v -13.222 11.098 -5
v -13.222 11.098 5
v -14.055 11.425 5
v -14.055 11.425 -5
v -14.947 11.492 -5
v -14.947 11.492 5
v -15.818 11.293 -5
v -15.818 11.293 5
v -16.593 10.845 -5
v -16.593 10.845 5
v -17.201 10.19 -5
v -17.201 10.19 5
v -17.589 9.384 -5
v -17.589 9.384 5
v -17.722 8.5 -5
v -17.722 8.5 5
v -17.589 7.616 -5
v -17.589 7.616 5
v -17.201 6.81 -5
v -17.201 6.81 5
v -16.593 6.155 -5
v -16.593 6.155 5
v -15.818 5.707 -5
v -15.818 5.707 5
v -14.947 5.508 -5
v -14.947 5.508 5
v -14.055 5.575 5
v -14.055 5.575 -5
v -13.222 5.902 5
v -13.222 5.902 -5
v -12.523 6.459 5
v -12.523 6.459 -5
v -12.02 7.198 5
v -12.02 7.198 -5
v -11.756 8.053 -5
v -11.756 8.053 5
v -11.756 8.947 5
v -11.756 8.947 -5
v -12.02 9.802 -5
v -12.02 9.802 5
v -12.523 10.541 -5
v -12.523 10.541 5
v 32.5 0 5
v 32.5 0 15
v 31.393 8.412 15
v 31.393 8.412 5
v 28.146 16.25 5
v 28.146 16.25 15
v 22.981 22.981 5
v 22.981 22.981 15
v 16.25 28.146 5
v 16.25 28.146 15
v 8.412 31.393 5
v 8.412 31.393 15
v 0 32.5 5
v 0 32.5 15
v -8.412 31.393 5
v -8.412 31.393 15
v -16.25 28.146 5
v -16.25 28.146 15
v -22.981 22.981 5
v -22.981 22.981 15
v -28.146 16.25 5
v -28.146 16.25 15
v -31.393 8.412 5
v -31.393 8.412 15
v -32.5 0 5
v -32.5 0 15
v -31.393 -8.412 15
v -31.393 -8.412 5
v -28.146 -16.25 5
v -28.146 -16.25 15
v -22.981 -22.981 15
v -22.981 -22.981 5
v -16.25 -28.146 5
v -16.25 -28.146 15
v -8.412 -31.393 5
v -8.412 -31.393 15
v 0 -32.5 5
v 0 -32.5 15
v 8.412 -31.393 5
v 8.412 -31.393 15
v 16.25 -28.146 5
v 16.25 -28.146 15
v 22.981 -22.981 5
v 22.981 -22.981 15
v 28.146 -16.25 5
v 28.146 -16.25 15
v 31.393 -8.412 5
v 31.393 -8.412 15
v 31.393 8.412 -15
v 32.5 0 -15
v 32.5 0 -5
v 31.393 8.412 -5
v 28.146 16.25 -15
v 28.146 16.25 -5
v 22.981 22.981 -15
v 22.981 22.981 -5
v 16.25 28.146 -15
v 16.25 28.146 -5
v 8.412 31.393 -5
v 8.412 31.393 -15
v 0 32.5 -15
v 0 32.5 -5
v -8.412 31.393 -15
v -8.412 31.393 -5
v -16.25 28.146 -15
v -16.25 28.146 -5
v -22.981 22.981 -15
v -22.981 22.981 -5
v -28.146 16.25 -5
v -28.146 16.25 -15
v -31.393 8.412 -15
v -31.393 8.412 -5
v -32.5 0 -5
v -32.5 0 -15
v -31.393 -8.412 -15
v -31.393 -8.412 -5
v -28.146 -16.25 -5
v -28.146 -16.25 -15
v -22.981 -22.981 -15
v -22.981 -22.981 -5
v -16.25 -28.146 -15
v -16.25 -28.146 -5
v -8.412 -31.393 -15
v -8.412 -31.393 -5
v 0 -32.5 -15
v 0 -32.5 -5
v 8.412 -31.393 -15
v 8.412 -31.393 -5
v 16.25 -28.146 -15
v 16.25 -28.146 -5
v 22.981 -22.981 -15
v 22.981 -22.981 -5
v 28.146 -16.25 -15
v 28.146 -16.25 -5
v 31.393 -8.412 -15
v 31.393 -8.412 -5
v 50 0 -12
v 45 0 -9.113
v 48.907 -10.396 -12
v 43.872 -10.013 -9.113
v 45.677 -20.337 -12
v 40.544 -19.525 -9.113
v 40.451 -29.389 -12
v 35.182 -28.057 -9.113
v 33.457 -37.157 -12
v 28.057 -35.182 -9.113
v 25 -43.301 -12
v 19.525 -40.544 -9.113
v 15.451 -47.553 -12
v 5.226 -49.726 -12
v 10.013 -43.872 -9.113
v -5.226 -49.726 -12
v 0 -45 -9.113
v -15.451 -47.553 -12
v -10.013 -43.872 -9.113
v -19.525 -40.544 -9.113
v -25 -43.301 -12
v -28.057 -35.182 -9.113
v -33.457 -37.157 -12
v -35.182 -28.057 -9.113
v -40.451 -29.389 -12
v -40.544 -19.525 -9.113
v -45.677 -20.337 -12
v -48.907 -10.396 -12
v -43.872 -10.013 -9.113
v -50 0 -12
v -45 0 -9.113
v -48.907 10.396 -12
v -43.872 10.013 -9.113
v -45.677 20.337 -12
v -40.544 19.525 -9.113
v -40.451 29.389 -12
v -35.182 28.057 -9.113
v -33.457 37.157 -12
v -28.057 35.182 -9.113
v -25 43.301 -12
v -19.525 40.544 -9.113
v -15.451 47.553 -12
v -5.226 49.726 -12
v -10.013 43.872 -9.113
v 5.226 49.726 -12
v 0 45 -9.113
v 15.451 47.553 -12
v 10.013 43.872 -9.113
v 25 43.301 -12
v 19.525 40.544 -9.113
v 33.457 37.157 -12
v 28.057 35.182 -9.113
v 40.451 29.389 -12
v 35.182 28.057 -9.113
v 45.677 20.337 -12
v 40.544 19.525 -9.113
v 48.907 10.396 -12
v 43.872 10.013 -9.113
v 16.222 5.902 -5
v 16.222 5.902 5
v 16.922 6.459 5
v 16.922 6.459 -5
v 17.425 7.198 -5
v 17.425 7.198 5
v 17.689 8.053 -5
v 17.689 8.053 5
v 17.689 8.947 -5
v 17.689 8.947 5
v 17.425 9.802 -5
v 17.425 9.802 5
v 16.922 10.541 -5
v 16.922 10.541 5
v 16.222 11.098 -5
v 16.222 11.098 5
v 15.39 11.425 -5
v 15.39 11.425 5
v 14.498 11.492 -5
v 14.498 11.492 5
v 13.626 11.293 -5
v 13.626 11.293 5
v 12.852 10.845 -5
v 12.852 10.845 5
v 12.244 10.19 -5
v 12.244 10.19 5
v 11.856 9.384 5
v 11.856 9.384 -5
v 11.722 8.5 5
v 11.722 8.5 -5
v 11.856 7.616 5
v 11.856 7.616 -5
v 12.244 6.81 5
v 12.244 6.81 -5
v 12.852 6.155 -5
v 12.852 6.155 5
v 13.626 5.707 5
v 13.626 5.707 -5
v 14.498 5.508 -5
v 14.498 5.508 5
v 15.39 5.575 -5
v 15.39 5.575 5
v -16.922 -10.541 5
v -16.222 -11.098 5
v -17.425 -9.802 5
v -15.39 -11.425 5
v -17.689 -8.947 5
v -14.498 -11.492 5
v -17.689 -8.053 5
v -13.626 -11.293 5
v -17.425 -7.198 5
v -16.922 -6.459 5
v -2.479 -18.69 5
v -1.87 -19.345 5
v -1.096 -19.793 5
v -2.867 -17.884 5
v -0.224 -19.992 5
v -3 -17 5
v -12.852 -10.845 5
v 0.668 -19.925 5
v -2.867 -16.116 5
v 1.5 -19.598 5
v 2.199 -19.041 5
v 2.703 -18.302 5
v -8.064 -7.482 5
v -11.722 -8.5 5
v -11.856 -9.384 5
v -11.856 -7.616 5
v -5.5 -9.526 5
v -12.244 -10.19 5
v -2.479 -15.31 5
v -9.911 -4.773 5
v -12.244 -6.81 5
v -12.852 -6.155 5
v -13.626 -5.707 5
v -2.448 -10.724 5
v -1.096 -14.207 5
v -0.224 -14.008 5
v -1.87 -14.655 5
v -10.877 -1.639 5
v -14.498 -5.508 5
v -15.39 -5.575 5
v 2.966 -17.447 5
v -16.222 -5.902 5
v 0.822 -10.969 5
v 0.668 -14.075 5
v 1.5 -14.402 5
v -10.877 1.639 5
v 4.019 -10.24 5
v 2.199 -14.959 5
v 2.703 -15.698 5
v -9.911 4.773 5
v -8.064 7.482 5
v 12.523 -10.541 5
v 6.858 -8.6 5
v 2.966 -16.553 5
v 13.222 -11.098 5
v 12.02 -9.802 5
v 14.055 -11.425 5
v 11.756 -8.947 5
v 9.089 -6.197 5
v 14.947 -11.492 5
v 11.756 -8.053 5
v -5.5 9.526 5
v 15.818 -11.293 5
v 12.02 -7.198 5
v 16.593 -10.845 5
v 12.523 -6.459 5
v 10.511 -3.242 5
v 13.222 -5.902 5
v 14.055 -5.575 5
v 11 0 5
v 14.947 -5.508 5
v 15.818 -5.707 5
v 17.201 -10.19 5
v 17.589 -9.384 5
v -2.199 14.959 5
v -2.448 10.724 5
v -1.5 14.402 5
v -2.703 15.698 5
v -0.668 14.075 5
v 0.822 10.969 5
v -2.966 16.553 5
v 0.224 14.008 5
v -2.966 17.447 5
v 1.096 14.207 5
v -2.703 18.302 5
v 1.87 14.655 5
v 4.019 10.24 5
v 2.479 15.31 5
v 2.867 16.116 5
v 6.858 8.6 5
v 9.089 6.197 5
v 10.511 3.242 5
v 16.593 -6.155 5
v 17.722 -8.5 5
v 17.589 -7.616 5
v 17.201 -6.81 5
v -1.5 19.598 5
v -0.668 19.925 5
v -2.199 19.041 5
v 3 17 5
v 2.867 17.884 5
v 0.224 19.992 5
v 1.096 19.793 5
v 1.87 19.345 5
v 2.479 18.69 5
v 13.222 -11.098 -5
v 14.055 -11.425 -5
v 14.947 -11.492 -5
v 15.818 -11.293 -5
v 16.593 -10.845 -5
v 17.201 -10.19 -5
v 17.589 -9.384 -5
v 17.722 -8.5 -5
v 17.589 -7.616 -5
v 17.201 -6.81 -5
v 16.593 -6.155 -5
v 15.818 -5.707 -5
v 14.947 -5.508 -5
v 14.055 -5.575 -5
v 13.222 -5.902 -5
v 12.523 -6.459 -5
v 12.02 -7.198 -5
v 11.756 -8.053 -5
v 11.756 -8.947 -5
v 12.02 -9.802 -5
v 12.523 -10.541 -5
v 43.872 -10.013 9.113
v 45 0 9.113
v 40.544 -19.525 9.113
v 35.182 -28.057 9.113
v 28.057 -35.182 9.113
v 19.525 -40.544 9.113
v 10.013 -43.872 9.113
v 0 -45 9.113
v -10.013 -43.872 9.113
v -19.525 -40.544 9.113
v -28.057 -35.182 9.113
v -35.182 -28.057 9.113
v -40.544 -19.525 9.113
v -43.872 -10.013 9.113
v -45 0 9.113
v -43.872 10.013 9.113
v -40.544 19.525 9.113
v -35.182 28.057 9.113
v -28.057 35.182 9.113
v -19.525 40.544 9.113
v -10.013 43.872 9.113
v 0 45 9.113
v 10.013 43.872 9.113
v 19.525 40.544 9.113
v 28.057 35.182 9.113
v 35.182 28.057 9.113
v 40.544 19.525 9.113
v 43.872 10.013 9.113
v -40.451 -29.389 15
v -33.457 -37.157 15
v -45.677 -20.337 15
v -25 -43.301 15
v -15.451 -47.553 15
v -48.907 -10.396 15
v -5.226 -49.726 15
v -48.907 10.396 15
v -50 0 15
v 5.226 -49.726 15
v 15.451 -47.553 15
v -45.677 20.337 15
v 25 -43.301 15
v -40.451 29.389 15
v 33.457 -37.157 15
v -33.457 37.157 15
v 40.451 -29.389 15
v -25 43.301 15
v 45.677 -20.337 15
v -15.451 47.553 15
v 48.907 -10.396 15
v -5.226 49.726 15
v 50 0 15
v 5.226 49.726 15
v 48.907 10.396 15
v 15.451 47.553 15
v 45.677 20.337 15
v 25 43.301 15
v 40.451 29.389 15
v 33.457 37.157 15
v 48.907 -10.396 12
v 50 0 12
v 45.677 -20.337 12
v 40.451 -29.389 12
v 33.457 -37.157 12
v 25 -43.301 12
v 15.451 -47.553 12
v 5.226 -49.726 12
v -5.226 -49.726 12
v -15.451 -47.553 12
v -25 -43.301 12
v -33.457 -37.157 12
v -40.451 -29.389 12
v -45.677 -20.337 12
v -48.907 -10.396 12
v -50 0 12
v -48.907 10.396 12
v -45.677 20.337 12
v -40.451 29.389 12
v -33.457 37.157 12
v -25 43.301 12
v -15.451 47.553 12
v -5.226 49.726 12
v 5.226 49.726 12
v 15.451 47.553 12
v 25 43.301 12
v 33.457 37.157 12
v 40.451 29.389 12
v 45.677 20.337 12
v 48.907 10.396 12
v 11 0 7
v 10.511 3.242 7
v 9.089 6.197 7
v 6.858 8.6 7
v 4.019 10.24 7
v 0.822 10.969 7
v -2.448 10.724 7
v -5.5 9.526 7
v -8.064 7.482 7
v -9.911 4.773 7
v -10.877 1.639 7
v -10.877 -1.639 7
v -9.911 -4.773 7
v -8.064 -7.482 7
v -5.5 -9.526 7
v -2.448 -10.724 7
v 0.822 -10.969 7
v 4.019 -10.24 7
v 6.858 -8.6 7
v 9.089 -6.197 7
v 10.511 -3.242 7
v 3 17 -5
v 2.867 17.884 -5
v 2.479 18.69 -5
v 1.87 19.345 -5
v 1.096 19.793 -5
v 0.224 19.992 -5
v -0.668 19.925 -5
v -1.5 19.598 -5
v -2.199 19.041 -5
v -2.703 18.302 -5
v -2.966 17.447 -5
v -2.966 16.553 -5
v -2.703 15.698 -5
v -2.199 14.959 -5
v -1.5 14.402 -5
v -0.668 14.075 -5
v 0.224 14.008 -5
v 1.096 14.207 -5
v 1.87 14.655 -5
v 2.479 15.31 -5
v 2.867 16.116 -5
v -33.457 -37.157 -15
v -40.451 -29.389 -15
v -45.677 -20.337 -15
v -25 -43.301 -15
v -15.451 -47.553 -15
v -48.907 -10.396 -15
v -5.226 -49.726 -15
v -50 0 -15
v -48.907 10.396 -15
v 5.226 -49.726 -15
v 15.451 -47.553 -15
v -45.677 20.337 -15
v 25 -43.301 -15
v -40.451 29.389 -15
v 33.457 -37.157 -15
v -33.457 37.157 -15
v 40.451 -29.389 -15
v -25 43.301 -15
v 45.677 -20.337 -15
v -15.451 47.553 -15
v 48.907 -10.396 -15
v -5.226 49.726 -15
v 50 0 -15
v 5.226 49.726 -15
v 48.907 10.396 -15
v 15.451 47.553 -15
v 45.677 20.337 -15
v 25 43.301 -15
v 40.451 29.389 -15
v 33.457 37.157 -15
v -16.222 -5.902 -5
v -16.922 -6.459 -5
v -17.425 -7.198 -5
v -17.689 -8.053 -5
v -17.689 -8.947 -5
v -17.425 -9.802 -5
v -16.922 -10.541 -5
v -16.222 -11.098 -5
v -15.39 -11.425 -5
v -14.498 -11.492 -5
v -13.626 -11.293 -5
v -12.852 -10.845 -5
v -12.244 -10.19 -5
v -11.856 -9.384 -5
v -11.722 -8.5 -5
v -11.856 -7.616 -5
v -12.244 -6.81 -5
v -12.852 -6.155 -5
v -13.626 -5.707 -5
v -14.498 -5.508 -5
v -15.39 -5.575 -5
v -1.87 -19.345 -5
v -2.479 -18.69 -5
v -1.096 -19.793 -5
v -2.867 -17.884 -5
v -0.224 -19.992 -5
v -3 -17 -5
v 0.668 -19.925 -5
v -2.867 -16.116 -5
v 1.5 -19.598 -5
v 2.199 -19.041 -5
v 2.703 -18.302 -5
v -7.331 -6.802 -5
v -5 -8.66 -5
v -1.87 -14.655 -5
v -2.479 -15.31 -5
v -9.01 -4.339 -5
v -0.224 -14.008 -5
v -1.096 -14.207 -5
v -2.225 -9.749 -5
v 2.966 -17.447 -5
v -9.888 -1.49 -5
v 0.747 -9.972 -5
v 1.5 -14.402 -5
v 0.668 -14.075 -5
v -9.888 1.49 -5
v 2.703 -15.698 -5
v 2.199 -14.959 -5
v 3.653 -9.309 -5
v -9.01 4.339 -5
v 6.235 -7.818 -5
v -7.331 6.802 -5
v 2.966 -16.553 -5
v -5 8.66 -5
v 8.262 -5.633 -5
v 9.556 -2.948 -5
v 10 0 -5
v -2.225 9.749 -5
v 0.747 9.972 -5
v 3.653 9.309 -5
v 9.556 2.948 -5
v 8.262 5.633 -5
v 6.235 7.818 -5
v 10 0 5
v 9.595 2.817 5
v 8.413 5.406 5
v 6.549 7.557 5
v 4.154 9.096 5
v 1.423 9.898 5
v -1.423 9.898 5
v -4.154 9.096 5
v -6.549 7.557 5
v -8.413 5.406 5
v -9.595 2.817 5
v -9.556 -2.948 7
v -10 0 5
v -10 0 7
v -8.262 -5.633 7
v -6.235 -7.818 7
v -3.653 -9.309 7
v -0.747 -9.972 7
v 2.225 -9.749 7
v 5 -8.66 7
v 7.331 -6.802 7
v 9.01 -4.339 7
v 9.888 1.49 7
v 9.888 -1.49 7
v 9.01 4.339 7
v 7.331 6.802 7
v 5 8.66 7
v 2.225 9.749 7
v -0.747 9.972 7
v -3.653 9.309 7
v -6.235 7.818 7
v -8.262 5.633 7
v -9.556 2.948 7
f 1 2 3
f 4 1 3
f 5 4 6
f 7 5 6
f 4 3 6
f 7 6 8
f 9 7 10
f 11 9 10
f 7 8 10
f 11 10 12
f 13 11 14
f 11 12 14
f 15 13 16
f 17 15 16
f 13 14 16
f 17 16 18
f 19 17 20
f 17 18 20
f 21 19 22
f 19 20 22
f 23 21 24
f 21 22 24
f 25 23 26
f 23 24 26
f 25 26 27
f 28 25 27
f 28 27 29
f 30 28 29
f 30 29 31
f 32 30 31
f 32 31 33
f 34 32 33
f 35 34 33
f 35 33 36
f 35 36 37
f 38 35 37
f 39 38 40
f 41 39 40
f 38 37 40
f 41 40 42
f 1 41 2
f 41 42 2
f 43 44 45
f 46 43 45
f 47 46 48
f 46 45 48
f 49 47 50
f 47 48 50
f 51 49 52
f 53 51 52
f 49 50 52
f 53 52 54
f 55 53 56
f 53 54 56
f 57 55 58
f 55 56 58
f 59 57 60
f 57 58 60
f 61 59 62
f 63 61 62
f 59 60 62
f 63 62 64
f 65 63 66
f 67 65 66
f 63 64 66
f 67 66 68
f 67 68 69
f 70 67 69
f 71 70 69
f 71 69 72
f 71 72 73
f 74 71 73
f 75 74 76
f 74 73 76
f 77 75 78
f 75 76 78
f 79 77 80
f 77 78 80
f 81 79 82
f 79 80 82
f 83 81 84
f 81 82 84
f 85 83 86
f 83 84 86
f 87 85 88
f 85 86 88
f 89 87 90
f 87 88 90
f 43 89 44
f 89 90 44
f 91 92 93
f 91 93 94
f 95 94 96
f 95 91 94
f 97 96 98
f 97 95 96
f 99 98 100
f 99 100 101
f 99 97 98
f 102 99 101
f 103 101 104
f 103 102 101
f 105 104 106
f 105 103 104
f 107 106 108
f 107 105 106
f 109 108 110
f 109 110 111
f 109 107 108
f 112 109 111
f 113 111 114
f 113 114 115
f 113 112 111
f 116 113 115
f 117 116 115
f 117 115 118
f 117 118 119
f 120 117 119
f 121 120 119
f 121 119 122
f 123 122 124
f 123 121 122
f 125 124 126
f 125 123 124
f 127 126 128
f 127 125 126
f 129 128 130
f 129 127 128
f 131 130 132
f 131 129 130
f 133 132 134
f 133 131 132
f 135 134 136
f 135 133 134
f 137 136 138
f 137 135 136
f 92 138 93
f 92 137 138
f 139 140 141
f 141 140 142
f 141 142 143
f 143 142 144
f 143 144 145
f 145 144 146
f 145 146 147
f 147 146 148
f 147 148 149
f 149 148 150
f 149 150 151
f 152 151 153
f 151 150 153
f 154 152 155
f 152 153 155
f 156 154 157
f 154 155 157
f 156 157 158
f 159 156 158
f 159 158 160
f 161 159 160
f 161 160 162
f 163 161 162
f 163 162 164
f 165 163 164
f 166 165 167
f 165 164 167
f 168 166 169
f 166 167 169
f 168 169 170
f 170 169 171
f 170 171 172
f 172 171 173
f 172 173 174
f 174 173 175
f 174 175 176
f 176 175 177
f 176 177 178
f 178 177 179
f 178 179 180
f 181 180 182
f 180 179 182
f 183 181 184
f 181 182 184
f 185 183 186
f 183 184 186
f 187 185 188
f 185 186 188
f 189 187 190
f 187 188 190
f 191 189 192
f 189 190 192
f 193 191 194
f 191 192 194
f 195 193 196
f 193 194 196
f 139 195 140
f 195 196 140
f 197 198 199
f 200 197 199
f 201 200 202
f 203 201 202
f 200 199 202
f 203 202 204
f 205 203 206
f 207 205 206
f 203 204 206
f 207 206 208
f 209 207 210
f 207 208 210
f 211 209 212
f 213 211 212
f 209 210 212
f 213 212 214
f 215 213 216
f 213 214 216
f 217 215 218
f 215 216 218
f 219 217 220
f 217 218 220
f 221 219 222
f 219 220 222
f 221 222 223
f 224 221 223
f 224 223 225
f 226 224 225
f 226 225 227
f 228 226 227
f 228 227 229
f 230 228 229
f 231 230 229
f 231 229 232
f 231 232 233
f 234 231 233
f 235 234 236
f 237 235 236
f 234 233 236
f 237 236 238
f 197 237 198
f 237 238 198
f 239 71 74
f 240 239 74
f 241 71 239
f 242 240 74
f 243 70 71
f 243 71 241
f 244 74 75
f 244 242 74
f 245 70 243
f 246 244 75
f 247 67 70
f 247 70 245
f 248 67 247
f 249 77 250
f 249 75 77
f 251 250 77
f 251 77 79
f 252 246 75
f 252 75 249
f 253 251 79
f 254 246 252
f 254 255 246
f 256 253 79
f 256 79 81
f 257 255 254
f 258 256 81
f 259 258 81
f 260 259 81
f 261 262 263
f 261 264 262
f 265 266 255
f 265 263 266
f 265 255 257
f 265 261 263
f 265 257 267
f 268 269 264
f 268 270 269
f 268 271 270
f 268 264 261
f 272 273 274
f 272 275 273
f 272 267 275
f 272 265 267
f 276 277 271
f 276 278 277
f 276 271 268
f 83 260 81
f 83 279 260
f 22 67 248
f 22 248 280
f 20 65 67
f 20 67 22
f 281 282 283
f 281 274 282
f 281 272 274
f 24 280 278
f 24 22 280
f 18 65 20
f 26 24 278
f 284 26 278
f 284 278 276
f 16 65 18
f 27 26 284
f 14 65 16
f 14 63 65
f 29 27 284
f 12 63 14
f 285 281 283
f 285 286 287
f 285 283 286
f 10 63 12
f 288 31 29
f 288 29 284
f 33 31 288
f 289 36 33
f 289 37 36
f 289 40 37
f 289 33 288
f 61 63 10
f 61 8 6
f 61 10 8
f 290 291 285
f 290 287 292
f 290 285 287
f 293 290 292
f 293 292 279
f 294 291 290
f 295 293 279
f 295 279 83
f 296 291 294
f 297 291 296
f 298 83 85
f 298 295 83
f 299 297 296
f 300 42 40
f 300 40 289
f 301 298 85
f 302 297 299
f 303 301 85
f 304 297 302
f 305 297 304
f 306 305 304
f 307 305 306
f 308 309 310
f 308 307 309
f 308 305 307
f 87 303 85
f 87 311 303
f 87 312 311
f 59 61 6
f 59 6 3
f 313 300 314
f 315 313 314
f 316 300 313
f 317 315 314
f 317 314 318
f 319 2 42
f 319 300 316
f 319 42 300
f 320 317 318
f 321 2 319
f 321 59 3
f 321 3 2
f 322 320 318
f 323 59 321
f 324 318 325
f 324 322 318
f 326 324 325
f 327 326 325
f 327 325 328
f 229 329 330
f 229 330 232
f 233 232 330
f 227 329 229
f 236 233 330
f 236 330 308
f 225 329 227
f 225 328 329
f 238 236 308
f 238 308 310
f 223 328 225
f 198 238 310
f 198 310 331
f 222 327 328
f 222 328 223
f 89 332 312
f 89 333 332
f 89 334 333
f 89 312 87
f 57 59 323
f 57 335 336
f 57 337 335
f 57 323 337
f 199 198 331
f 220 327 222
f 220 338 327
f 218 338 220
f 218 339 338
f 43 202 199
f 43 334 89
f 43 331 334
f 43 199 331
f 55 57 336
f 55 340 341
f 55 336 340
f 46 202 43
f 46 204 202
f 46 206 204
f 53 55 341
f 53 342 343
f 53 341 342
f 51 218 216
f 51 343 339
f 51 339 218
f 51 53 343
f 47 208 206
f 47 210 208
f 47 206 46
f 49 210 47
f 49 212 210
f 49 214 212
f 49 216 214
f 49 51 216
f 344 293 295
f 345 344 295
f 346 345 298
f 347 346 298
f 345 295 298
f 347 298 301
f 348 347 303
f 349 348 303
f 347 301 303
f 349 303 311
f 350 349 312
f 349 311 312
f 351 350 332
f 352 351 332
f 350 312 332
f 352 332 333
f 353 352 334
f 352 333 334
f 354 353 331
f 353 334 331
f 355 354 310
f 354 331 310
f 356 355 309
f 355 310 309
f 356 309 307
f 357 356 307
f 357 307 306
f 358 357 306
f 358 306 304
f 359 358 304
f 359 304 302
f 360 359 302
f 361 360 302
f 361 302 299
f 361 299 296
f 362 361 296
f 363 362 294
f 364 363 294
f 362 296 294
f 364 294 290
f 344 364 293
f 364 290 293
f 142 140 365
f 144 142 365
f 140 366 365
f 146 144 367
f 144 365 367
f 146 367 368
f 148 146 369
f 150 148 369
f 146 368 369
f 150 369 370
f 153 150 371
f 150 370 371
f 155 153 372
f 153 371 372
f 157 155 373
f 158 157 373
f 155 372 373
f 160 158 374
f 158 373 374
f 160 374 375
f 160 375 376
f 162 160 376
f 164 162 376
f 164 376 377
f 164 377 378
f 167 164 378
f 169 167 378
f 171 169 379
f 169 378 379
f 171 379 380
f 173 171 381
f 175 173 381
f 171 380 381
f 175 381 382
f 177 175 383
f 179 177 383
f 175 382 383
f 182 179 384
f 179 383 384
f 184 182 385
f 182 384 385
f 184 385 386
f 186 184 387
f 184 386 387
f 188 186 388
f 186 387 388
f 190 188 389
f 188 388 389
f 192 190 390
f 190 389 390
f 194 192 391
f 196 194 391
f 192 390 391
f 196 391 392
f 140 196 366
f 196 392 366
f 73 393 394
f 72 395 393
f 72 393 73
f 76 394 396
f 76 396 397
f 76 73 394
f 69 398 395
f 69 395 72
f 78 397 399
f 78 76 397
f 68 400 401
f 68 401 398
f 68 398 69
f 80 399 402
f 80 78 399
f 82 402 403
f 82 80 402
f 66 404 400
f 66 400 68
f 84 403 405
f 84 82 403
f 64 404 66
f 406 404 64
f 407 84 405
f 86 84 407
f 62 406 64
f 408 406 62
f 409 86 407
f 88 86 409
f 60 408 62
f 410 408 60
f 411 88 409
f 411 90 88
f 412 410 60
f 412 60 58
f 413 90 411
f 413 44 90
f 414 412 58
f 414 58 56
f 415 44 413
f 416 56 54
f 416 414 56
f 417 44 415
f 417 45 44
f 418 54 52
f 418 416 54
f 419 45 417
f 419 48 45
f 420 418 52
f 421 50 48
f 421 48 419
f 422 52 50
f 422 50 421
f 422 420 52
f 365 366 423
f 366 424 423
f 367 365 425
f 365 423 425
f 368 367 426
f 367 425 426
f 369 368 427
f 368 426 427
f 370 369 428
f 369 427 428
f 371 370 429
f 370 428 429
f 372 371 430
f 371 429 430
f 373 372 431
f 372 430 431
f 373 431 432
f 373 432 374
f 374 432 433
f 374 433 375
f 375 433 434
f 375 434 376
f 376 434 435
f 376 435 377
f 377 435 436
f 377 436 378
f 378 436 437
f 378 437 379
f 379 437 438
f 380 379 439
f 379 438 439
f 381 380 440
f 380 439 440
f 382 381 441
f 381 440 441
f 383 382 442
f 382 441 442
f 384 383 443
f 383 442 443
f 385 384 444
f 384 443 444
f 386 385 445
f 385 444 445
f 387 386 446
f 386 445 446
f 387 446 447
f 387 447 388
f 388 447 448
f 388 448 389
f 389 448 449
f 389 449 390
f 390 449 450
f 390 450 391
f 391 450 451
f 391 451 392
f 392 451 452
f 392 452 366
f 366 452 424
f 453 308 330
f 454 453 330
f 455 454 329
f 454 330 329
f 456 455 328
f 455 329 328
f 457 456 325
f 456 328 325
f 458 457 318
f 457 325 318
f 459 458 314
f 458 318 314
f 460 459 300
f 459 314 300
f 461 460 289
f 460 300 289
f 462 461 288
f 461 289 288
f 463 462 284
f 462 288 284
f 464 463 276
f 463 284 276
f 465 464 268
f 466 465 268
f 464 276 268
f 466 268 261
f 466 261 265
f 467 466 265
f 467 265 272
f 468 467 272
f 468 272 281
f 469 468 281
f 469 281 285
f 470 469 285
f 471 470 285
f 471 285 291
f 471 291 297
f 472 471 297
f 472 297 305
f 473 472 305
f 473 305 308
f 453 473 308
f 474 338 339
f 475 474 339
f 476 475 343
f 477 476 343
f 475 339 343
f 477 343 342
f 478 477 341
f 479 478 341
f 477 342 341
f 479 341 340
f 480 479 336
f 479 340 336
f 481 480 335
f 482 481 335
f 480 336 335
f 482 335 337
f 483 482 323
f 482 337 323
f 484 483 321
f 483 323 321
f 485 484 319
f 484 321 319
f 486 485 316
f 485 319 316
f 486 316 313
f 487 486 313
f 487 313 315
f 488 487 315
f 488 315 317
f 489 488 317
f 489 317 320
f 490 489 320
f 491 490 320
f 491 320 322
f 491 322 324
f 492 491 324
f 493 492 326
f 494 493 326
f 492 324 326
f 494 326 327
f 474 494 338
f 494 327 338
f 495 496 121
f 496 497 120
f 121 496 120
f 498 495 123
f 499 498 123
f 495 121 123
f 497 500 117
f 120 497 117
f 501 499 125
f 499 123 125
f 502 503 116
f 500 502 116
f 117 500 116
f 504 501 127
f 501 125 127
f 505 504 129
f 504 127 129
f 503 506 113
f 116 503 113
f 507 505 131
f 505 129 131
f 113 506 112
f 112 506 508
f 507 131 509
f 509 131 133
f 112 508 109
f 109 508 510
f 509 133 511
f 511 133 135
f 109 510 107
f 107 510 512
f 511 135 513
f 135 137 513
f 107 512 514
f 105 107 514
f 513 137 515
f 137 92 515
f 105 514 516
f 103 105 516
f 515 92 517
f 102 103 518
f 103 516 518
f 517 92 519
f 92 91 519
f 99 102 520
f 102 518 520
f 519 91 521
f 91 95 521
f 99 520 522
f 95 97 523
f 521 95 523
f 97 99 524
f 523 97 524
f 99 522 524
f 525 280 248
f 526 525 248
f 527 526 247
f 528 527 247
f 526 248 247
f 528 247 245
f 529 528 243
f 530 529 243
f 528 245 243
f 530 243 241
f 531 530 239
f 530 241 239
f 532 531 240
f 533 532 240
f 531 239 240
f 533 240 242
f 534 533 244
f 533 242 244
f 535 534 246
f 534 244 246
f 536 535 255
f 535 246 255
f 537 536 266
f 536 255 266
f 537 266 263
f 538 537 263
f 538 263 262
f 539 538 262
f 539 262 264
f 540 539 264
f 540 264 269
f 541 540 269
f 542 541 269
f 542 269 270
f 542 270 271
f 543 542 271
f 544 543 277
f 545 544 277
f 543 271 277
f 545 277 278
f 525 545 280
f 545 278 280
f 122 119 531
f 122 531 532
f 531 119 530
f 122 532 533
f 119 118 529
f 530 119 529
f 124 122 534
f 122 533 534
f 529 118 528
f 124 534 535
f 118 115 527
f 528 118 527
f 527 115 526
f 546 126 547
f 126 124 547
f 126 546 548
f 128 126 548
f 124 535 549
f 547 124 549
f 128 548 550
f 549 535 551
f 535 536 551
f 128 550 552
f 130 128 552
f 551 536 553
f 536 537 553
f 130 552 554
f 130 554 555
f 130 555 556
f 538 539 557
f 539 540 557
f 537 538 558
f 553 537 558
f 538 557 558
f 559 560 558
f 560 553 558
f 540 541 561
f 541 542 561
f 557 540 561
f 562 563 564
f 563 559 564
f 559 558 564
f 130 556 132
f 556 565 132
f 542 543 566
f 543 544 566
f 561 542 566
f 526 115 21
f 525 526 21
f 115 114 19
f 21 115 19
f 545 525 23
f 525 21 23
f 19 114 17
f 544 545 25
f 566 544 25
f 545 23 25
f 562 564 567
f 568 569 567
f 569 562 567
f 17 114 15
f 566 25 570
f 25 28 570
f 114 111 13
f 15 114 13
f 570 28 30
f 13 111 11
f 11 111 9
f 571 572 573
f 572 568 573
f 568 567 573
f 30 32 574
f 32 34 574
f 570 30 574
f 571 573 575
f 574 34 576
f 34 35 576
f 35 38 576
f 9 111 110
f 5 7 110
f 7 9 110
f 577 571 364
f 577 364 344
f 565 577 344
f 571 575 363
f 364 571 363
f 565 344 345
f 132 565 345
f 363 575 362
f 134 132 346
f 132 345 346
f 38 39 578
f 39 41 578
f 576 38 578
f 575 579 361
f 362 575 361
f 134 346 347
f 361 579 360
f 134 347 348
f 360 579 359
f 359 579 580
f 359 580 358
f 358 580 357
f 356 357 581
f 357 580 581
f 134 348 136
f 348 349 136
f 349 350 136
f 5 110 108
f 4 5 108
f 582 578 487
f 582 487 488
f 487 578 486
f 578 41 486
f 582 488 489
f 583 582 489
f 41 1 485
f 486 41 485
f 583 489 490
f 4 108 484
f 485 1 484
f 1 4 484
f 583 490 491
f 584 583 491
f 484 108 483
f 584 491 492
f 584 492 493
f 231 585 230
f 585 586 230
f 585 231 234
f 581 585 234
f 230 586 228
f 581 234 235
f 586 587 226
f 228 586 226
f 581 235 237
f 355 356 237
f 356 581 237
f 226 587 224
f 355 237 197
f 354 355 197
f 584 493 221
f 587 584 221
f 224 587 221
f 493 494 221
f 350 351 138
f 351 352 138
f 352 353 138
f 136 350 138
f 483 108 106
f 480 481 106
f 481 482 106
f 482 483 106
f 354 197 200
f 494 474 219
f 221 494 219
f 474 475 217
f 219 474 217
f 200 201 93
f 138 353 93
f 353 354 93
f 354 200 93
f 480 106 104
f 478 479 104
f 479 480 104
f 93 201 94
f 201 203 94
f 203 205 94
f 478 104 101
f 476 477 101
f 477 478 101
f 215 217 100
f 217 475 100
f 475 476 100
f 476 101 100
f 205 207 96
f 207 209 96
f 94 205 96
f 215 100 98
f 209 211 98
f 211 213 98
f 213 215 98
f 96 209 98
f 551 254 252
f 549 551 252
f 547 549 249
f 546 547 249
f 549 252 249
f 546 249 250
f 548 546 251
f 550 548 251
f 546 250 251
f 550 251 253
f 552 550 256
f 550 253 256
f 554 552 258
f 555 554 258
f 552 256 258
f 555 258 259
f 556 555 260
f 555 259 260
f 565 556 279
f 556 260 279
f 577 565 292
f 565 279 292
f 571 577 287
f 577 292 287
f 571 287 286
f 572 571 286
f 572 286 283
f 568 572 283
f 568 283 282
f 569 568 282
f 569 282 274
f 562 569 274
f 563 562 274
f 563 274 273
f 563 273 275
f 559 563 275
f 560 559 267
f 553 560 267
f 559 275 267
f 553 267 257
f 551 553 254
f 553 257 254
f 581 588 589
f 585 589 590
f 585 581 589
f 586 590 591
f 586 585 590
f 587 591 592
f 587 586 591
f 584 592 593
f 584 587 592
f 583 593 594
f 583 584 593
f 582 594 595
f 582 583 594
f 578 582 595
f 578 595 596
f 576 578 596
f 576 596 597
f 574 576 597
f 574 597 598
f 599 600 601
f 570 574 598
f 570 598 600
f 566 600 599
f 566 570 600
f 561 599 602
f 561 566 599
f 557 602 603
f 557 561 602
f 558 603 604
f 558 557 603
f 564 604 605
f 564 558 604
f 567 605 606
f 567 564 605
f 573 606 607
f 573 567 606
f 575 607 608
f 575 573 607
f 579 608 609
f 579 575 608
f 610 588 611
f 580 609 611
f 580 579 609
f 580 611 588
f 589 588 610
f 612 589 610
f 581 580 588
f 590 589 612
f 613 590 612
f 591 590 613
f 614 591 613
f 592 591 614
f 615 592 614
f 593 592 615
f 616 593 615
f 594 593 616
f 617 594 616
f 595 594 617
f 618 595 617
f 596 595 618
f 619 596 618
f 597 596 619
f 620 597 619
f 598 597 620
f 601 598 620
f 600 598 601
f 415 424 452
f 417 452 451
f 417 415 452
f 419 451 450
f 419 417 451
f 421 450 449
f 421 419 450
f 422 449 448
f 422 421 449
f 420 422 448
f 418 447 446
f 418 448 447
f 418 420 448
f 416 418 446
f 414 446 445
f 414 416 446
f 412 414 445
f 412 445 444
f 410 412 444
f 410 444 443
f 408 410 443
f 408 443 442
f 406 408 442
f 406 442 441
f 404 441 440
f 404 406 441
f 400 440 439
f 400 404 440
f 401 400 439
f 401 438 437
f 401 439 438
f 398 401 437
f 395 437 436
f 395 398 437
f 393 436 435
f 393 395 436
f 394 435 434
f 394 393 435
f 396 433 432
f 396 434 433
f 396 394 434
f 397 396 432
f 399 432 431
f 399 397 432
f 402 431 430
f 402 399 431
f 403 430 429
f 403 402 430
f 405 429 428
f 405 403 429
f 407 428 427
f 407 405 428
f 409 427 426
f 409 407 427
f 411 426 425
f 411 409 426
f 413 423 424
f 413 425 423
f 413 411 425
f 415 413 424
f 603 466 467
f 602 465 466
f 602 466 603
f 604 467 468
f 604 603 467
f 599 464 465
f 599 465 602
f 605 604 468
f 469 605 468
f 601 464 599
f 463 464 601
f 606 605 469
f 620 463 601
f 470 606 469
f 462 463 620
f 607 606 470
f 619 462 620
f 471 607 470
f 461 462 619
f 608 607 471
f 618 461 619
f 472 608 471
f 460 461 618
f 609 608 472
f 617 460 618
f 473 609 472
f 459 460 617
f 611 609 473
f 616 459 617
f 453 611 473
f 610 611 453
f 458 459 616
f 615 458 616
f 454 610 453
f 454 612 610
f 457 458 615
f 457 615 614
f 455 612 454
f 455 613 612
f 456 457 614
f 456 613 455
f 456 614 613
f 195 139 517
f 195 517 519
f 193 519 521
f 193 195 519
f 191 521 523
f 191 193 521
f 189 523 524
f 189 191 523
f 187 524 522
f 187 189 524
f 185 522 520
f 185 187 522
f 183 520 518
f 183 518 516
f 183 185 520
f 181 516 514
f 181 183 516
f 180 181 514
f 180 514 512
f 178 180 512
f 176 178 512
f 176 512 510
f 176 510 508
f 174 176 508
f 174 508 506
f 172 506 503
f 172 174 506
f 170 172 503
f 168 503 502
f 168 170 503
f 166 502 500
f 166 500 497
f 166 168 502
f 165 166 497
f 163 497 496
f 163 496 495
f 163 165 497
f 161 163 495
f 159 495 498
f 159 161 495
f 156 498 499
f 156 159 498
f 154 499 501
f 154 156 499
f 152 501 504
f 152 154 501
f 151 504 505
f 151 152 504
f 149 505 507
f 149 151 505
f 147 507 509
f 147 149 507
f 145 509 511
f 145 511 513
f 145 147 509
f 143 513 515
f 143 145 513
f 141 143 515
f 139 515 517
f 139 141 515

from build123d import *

# Parameters (mm, degrees)
SKETCH1_R                = 50
SKETCH1_R_2              = 10
BOSS_EXTRUDE1_DEPTH      = 15
SKETCH2_R                = 32.5
CUT_EXTRUDE2_DEPTH       = 10
SKETCH3_R                = 3
CUT_EXTRUDE8_DEPTH       = 10
CIRPATTERN1_COUNT        = 6
BOSS_EXTRUDE3_DEPTH      = 2
BOSS_EXTRUDE3_DEPTH_BACK = 7
SKETCH4_R                = 11
SKETCH4_R_2              = 10


with BuildPart() as part:
    # Sketch1 → Boss-Extrude1 (new, symmetric)
    with BuildSketch(Plane.XY):
        Circle(SKETCH1_R)
        Circle(SKETCH1_R_2, mode=Mode.SUBTRACT)
    extrude(amount=BOSS_EXTRUDE1_DEPTH, both=True)

    # Sketch2 → Cut-Extrude2 (cut)
    with BuildSketch(Plane.XY.offset(15)):
        Circle(SKETCH2_R)
    cut_extrude2 = extrude(amount=-CUT_EXTRUDE2_DEPTH, mode=Mode.SUBTRACT)

    # Mirror2: Cut-Extrude2 across plane
    add(cut_extrude2.mirror(Plane.XY), mode=Mode.SUBTRACT)

    # Sketch3 → Cut-Extrude8 (cut)
    with BuildSketch(Plane.XY.offset(5)):
        with Locations((0, 17)):
            Circle(SKETCH3_R)
    cut_extrude8 = extrude(amount=-CUT_EXTRUDE8_DEPTH, mode=Mode.SUBTRACT)

    # CirPattern1: Cut-Extrude8 ×6 about axis
    cirpattern1_axis = Axis((0, 0, 0), (0, 0, 1))
    for i in range(1, CIRPATTERN1_COUNT):
        add(cut_extrude8.rotate(cirpattern1_axis, i * 360 / CIRPATTERN1_COUNT), mode=Mode.SUBTRACT)

    # Sketch4 → Boss-Extrude3 (add, two sides: drawn at the far end of the back side and taken through both)
    with BuildSketch(Plane.XY.offset(5).offset(-BOSS_EXTRUDE3_DEPTH_BACK)):
        Circle(SKETCH4_R)
        with Locations(Location((0, 0, 0), (0, 0, 180))):
            Circle(SKETCH4_R_2, mode=Mode.SUBTRACT)
    extrude(amount=BOSS_EXTRUDE3_DEPTH + BOSS_EXTRUDE3_DEPTH_BACK)

    # Sketch5 → Cut-Revolve2 (revolve, cut)
    with BuildSketch(Plane(origin=(0, 0, 0), x_dir=(1, 0, 0), z_dir=(0, 1, 0))):
        Polygon((50, 12), (45, 9.113248654), (45, -9.113248654), (50, -12), align=None)
    revolve(axis=Axis((0, 0, 0), (0, 0, -1)), mode=Mode.SUBTRACT)


solid = part.part
